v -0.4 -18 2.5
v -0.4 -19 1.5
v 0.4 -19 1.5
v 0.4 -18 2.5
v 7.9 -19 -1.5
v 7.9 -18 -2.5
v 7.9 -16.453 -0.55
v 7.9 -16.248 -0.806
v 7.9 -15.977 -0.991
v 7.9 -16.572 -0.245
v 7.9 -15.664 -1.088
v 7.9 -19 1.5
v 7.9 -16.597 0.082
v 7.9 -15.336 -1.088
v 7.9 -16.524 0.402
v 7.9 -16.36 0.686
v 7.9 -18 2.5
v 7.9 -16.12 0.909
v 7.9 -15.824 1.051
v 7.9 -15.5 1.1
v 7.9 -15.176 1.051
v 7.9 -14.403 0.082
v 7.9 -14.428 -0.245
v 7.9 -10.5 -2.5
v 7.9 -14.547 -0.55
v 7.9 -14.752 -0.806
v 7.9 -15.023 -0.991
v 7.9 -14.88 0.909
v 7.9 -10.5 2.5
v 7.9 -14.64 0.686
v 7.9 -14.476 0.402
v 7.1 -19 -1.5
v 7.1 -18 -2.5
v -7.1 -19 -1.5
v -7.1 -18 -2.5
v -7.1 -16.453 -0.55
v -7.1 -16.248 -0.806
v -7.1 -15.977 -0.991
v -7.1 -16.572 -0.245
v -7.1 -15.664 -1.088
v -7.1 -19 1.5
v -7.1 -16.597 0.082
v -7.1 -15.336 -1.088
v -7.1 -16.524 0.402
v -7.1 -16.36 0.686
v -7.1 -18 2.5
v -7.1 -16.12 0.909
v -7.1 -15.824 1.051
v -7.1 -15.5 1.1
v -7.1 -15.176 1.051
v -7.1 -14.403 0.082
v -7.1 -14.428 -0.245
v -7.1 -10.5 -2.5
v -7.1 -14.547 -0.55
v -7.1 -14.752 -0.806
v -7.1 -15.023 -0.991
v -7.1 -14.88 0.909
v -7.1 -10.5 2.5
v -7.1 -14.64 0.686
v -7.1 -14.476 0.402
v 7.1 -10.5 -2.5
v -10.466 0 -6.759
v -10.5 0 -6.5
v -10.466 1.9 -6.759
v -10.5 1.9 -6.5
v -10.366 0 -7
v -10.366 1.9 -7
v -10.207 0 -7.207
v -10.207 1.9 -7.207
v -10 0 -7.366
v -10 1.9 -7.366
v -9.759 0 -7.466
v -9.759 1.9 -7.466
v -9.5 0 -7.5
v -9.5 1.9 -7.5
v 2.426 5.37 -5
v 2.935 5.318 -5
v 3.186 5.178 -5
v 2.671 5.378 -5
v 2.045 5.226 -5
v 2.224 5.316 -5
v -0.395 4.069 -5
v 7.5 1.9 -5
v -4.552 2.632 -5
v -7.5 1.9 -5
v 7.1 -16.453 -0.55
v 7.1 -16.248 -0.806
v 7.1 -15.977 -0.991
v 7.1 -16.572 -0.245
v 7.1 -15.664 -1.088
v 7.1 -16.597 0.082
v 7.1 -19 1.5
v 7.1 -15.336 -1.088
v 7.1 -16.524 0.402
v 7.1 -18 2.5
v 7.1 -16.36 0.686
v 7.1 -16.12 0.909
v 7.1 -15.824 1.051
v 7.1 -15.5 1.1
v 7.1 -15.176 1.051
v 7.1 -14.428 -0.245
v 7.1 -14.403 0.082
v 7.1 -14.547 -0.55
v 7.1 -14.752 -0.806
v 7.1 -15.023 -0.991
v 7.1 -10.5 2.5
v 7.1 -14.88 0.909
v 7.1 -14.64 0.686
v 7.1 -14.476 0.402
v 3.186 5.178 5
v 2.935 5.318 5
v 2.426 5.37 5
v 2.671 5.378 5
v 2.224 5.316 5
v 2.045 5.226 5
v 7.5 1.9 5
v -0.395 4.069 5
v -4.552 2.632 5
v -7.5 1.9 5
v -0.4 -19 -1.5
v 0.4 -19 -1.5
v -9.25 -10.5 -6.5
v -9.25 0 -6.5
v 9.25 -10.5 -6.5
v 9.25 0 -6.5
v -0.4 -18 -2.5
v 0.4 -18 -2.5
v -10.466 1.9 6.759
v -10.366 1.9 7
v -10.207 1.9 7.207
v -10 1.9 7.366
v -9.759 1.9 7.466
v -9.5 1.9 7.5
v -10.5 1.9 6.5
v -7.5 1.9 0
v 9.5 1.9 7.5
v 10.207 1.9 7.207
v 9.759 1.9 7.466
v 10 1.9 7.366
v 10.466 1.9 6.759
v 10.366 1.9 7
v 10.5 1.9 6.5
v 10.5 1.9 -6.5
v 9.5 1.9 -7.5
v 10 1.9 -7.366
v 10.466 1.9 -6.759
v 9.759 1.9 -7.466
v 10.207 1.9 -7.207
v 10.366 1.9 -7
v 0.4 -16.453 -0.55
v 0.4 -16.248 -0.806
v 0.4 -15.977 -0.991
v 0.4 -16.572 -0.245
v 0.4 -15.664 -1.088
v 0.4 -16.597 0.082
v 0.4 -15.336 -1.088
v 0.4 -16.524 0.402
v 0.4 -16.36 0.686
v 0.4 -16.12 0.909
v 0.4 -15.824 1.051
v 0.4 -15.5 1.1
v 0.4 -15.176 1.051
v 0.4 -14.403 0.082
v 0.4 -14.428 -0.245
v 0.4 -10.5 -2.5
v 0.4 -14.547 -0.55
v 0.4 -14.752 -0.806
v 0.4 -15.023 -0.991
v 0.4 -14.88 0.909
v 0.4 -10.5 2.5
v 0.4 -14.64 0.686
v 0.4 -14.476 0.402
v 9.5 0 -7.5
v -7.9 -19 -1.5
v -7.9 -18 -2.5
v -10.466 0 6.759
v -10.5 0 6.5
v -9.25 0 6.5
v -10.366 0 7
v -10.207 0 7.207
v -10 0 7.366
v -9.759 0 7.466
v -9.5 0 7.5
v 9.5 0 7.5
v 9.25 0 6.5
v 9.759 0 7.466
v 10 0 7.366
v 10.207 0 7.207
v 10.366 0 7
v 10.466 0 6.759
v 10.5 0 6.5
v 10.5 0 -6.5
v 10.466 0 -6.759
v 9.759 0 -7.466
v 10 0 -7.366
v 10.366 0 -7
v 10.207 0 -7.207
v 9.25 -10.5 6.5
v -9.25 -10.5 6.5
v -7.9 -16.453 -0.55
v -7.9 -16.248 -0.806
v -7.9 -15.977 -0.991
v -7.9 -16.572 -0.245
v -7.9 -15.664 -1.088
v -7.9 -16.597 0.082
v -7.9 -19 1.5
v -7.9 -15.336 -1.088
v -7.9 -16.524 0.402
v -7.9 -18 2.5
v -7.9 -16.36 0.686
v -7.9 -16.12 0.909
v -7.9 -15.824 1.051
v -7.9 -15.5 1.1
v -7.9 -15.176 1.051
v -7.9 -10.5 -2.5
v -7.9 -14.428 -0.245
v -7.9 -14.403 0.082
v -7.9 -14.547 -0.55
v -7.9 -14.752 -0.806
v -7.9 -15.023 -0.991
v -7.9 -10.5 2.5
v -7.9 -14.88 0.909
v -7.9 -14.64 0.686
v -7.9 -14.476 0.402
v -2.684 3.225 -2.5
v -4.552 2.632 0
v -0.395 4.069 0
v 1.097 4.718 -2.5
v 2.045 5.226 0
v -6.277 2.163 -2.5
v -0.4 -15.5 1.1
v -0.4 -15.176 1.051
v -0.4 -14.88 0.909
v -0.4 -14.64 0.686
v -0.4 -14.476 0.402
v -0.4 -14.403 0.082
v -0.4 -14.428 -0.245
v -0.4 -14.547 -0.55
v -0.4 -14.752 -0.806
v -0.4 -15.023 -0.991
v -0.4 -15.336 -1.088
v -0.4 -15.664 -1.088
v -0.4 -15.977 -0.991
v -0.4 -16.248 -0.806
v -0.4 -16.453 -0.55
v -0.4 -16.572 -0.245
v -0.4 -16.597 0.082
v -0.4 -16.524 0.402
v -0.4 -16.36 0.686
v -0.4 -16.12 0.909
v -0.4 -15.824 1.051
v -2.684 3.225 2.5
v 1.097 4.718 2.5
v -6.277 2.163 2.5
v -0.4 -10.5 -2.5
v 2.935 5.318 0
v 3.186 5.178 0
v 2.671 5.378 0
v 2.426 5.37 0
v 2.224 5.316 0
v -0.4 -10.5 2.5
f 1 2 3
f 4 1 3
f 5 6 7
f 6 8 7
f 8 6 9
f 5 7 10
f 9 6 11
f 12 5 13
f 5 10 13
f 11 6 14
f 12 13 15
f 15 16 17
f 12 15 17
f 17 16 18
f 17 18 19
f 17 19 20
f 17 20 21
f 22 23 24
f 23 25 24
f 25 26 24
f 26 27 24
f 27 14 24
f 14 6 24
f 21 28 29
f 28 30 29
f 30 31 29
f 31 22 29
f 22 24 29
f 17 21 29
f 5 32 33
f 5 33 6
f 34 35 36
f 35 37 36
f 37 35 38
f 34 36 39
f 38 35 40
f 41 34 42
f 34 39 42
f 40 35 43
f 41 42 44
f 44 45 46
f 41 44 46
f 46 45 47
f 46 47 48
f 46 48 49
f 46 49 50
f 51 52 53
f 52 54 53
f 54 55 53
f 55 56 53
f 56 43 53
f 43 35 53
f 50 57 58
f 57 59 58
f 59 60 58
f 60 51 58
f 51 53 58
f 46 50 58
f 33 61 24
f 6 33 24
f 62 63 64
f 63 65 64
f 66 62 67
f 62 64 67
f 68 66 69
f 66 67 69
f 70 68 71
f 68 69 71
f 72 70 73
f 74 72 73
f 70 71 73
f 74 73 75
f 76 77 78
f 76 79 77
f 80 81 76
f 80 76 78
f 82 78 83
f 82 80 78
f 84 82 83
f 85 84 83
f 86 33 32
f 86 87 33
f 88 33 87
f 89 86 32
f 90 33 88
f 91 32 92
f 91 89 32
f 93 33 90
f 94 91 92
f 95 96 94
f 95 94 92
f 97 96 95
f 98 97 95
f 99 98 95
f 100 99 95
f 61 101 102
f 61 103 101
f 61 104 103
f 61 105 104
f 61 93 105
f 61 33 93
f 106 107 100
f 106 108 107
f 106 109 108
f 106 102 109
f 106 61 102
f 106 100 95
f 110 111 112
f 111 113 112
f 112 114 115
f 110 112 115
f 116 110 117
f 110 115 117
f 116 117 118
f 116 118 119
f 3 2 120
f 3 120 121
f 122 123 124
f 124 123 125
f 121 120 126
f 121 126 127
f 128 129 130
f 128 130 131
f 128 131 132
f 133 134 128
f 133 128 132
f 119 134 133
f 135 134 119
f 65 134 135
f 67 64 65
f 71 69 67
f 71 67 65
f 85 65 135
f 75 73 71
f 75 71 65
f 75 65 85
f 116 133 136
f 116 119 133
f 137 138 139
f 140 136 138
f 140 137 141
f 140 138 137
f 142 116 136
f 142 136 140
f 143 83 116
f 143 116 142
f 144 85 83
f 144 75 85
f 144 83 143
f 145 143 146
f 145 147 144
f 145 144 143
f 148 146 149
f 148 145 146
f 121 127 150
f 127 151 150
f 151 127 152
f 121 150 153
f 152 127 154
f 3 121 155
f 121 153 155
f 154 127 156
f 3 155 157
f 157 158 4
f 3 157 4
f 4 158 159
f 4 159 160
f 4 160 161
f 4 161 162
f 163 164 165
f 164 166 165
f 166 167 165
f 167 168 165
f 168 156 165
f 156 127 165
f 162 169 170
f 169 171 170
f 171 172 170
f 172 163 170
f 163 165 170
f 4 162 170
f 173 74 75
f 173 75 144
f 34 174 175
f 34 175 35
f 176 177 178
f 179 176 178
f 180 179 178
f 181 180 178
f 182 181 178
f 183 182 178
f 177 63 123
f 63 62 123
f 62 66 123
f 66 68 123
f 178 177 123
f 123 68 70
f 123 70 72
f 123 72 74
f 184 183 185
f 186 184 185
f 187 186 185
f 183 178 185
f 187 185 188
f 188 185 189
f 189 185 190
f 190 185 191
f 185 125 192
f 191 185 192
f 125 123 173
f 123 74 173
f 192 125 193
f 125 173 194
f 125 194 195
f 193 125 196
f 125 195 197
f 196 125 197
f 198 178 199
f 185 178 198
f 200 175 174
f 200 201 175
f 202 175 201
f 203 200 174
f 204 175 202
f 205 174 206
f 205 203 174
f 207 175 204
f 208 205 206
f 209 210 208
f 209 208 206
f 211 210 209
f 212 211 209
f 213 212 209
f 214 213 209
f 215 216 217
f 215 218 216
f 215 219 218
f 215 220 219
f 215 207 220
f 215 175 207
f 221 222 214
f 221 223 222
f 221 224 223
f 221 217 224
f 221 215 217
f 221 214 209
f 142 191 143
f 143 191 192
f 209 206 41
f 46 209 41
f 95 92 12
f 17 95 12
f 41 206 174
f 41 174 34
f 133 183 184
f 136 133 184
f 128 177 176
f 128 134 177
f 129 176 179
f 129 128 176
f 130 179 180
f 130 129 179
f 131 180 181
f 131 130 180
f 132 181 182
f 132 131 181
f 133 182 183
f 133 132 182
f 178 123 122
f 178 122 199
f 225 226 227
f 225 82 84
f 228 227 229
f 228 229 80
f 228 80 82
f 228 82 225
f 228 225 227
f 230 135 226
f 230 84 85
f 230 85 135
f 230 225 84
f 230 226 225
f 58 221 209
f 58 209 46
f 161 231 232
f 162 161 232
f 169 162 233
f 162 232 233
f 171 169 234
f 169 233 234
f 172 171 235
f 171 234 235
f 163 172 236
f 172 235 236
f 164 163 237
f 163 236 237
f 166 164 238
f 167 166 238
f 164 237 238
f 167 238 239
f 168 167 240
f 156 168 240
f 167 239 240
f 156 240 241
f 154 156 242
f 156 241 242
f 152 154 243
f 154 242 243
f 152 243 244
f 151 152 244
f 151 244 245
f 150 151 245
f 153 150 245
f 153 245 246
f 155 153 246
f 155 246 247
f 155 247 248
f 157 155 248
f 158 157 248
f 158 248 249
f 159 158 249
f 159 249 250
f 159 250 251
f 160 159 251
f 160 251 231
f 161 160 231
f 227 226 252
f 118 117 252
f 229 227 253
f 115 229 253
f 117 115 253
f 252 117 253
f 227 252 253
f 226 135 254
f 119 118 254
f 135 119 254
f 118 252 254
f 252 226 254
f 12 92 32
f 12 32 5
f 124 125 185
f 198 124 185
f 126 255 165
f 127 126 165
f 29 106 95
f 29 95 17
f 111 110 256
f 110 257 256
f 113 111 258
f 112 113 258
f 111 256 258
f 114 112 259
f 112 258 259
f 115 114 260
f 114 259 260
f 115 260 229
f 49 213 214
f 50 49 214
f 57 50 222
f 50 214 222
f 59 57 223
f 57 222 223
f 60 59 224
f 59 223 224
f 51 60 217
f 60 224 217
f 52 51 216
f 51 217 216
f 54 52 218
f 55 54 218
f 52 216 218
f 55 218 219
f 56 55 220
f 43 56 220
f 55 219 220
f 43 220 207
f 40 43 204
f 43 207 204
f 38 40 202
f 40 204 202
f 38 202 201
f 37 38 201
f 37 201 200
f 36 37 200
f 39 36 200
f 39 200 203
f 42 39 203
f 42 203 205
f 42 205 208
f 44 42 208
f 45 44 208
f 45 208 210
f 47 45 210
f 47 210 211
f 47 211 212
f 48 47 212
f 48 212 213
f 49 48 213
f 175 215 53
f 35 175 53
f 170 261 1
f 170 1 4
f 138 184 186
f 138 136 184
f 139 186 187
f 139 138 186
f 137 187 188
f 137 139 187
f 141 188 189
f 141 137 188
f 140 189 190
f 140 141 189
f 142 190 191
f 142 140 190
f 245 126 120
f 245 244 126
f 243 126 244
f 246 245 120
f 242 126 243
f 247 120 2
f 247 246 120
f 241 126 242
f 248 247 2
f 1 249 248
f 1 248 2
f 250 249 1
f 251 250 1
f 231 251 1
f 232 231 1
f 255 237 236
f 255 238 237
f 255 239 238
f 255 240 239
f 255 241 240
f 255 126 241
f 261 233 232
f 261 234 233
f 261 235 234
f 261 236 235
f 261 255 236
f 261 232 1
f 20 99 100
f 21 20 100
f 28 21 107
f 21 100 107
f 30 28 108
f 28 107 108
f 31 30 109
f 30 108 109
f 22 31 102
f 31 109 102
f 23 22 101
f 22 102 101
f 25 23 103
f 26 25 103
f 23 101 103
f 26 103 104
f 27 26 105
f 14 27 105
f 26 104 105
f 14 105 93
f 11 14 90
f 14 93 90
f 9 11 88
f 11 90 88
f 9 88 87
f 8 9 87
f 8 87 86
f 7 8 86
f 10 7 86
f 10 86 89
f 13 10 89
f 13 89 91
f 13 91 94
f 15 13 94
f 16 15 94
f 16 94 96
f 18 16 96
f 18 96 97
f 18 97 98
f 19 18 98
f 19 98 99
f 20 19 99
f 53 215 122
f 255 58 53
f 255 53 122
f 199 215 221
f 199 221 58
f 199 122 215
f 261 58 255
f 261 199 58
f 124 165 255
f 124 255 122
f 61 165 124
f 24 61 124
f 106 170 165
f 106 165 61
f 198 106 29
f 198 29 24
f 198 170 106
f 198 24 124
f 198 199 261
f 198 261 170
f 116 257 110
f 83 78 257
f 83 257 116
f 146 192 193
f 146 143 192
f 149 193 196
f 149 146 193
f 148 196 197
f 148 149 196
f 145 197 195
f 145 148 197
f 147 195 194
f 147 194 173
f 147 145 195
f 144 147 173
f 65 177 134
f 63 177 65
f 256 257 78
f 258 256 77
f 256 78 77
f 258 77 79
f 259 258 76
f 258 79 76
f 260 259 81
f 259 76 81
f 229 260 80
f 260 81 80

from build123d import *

# Parameters (mm, degrees)
SKETCH1_W           = 21
SKETCH1_H           = 15
BOSS_EXTRUDE1_DEPTH = 1.9
FILLET1_R           = 1
SKETCH2_W           = 18.5
SKETCH2_H           = 13
BOSS_EXTRUDE2_DEPTH = 10.5
BOSS_EXTRUDE3_START = -6.5
BOSS_EXTRUDE3_DEPTH = 5
FILLET2_R           = 1
SKETCH5_W           = 0.8
SKETCH5_H           = 5
BOSS_EXTRUDE4_DEPTH = 8.5
CHAMFER1_SIZE       = 1
SKETCH6_R           = 1.1
CUT_EXTRUDE1_DEPTH  = 28.491998836


with BuildPart() as part:
    # Sketch1 → Boss-Extrude1 (new body)
    with BuildSketch(Plane(origin=(0, 0, 0), x_dir=(1, 0, 0), z_dir=(0, 1, 0))):
        Rectangle(SKETCH1_W, SKETCH1_H)
    extrude(amount=BOSS_EXTRUDE1_DEPTH)

    # Fillet1
    fillet1_edges = [part.edges().sort_by_distance(p)[0] for p in [
        (10.5, 0.95, 7.5),
        (-10.5, 0.95, 7.5),
        (-10.5, 0.95, -7.5),
        (10.5, 0.95, -7.5),
    ]]
    fillet(fillet1_edges, radius=FILLET1_R)

    # Sketch2 → Boss-Extrude2 (add)
    with BuildSketch(Plane.XZ):
        Rectangle(SKETCH2_W, SKETCH2_H)
    extrude(amount=BOSS_EXTRUDE2_DEPTH)

    # Sketch4 → Boss-Extrude3 (add, symmetric)
    with BuildSketch(Plane(origin=(0, 0, -6.5), x_dir=(-1, 0, 0), z_dir=(0, 0, -1)).offset(BOSS_EXTRUDE3_START)):
        with BuildLine():
            Line((-7.5, 1.9), (7.5, 1.9))
            add(Edge.make_bspline(
                [(-2.5, 5.7), (-3.131503611, 3.8), (7.5, 1.9)],
                knots=[0, 0, 0, 2.456334169, 2.456334169, 2.456334169], degree=2, weights=[1, 0.335964667, 1]))
            Line((-2.5, 5.7), (-7.5, 1.9))
        make_face()
    extrude(amount=BOSS_EXTRUDE3_DEPTH, both=True)

    # Fillet2
    fillet2_edges = [part.edges().sort_by_distance(p)[0] for p in [
        (2.5, 5.7, -2.5),
    ]]
    fillet(fillet2_edges, radius=FILLET2_R)

    # Sketch5 → Boss-Extrude4 (add)
    with BuildSketch(Plane.XZ.offset(10.5)):
        with Locations((7.5, 0)):
            Rectangle(SKETCH5_W, SKETCH5_H)
        Rectangle(SKETCH5_W, SKETCH5_H)
        with Locations((-7.5, 0)):
            Rectangle(SKETCH5_W, SKETCH5_H)
    extrude(amount=BOSS_EXTRUDE4_DEPTH)

    # Chamfer1
    chamfer1_edges = [part.edges().sort_by_distance(p)[0] for p in [
        (0, -19, 2.5),
        (0, -19, -2.5),
        (7.5, -19, 2.5),
        (7.5, -19, -2.5),
        (-7.5, -19, 2.5),
        (-7.5, -19, -2.5),
    ]]
    chamfer(chamfer1_edges, length=CHAMFER1_SIZE)

    # Sketch6 → Cut-Extrude1 (cut, through all)
    with BuildSketch(Plane.ZY.offset(7.9)):
        with Locations((0, -15.5)):
            Circle(SKETCH6_R)
    extrude(amount=-CUT_EXTRUDE1_DEPTH, mode=Mode.SUBTRACT)


solid = part.part
